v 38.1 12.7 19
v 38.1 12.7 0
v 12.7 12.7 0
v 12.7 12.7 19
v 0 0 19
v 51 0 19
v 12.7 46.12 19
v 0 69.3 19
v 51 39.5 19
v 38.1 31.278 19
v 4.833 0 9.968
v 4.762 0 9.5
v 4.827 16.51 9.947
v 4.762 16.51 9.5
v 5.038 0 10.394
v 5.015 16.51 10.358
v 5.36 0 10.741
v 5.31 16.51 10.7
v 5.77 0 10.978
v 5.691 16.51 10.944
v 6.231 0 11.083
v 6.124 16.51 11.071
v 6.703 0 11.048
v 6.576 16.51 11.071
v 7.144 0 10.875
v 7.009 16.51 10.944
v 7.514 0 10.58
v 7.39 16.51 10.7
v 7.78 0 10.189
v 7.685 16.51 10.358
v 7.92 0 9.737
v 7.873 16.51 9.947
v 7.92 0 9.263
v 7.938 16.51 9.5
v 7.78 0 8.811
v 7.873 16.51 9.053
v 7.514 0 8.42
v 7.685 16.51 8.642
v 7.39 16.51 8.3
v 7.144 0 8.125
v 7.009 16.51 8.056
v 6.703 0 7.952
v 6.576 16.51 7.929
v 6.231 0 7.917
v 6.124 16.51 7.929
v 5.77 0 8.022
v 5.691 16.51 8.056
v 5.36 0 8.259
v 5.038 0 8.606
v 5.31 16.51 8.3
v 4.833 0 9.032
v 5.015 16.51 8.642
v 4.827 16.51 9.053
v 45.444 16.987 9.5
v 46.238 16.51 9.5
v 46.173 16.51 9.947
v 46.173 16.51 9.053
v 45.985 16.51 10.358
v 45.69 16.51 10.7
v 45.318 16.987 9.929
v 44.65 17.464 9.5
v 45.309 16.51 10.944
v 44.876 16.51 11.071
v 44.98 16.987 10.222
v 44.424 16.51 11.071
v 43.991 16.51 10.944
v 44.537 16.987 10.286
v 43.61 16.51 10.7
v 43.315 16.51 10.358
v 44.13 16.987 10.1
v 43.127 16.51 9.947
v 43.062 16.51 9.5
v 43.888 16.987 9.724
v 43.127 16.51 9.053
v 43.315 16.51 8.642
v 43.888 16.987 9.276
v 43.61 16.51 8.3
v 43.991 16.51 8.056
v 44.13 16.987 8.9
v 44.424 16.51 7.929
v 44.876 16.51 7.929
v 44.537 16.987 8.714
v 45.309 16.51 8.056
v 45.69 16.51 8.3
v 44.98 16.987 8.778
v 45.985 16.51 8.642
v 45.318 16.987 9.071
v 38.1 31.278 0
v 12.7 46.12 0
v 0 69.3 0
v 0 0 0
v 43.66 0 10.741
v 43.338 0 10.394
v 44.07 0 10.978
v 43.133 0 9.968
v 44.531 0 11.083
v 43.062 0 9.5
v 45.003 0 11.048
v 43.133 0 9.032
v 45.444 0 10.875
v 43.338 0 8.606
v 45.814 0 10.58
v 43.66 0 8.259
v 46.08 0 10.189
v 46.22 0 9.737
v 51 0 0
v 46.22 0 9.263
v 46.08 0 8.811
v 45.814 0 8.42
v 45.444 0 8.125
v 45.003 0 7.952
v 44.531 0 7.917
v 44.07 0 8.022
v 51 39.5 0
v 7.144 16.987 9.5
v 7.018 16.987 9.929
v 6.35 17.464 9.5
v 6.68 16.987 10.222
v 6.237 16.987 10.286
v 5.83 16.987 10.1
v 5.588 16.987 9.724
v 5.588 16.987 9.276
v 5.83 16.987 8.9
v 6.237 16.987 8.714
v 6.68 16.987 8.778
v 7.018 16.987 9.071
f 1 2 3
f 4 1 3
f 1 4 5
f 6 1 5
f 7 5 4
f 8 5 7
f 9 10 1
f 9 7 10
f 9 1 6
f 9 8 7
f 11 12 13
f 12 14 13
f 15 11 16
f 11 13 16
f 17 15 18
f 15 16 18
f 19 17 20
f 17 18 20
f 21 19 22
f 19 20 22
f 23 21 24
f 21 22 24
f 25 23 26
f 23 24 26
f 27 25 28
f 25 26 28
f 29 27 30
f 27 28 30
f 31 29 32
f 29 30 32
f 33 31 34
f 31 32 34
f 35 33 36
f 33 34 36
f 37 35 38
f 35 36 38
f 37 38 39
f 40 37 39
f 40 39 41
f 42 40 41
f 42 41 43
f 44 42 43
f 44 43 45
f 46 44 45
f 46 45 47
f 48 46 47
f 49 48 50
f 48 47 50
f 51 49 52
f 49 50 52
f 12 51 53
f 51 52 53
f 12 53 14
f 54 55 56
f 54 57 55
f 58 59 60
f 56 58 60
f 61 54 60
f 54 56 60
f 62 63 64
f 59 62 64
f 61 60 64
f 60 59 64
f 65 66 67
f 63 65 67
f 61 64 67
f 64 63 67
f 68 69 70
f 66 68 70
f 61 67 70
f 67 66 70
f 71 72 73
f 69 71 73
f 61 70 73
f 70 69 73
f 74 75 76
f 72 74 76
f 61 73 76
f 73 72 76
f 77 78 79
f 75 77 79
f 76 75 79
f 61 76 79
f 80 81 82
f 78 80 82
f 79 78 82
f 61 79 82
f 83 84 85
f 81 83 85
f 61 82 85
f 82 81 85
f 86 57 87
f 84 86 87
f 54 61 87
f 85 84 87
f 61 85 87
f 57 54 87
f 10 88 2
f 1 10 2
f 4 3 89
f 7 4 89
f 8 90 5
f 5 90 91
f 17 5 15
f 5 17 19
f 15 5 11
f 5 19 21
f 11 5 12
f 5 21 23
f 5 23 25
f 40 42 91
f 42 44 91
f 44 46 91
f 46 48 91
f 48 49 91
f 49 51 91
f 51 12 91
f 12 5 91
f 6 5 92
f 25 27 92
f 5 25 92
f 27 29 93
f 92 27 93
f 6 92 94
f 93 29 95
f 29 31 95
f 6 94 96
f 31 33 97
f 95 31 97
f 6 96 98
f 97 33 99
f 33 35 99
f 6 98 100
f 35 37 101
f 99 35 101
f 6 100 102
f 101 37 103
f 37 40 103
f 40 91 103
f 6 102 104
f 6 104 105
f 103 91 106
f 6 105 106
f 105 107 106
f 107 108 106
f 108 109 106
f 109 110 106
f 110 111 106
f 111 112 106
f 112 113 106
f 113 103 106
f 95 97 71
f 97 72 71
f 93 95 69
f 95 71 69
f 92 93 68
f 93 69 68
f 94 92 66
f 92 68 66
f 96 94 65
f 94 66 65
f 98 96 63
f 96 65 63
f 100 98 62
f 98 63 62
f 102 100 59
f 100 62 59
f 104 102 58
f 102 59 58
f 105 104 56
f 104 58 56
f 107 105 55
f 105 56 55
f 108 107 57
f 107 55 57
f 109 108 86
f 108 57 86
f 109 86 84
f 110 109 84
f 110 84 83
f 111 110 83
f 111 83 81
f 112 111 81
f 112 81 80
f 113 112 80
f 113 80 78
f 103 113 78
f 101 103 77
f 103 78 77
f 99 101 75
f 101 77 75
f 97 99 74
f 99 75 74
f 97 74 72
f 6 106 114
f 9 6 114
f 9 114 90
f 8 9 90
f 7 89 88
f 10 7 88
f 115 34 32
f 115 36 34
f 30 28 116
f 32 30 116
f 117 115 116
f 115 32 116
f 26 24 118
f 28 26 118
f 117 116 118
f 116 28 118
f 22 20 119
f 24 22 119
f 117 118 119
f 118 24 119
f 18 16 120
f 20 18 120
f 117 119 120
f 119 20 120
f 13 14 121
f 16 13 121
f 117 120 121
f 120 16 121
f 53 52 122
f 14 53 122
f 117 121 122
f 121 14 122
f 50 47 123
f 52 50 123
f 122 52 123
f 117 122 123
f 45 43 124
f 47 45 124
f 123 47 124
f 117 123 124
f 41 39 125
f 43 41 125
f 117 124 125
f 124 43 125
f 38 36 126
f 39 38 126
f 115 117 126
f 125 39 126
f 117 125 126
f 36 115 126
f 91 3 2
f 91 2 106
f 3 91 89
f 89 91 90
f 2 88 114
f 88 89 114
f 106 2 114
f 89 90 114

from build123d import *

# Parameters (mm, degrees)
F1_DEPTH = 19
F2_R     = 1.0795
F3_DEPTH = 19.05
F5_D     = 3.175
F5_DEPTH = 16.51
F5_TIP   = 0.9538662327


with BuildPart() as f1:
    # F0 (on Top) → F1 (new body)
    with BuildSketch(Plane.XY):
        Polygon((0, 69.3), (0, 0), (51, 0), (51, 39.5), align=None)
        Polygon((38.1, 12.7), (12.7, 12.7), (12.7, 46.1200160448), (38.1, 31.2784474173), align=None, mode=Mode.SUBTRACT)
    extrude(amount=F1_DEPTH)

    # F2 (on face) → F3 (join)
    with BuildSketch(Plane.XZ):
        with Locations((6.35, 9.5)):
            Circle(F2_R)
        with Locations((44.65, 9.5)):
            Circle(F2_R)
    extrude(amount=-F3_DEPTH)

    # F5
    with Locations(Plane.XZ):
        with Locations((6.35, 9.5), (44.65, 9.5)):
            Hole(F5_D / 2, depth=F5_DEPTH)
            with Locations((0, 0, -(F5_DEPTH + F5_TIP / 2))):  # 118° drill point
                Cone(0, F5_D / 2, F5_TIP, mode=Mode.SUBTRACT)


solid = f1.part
